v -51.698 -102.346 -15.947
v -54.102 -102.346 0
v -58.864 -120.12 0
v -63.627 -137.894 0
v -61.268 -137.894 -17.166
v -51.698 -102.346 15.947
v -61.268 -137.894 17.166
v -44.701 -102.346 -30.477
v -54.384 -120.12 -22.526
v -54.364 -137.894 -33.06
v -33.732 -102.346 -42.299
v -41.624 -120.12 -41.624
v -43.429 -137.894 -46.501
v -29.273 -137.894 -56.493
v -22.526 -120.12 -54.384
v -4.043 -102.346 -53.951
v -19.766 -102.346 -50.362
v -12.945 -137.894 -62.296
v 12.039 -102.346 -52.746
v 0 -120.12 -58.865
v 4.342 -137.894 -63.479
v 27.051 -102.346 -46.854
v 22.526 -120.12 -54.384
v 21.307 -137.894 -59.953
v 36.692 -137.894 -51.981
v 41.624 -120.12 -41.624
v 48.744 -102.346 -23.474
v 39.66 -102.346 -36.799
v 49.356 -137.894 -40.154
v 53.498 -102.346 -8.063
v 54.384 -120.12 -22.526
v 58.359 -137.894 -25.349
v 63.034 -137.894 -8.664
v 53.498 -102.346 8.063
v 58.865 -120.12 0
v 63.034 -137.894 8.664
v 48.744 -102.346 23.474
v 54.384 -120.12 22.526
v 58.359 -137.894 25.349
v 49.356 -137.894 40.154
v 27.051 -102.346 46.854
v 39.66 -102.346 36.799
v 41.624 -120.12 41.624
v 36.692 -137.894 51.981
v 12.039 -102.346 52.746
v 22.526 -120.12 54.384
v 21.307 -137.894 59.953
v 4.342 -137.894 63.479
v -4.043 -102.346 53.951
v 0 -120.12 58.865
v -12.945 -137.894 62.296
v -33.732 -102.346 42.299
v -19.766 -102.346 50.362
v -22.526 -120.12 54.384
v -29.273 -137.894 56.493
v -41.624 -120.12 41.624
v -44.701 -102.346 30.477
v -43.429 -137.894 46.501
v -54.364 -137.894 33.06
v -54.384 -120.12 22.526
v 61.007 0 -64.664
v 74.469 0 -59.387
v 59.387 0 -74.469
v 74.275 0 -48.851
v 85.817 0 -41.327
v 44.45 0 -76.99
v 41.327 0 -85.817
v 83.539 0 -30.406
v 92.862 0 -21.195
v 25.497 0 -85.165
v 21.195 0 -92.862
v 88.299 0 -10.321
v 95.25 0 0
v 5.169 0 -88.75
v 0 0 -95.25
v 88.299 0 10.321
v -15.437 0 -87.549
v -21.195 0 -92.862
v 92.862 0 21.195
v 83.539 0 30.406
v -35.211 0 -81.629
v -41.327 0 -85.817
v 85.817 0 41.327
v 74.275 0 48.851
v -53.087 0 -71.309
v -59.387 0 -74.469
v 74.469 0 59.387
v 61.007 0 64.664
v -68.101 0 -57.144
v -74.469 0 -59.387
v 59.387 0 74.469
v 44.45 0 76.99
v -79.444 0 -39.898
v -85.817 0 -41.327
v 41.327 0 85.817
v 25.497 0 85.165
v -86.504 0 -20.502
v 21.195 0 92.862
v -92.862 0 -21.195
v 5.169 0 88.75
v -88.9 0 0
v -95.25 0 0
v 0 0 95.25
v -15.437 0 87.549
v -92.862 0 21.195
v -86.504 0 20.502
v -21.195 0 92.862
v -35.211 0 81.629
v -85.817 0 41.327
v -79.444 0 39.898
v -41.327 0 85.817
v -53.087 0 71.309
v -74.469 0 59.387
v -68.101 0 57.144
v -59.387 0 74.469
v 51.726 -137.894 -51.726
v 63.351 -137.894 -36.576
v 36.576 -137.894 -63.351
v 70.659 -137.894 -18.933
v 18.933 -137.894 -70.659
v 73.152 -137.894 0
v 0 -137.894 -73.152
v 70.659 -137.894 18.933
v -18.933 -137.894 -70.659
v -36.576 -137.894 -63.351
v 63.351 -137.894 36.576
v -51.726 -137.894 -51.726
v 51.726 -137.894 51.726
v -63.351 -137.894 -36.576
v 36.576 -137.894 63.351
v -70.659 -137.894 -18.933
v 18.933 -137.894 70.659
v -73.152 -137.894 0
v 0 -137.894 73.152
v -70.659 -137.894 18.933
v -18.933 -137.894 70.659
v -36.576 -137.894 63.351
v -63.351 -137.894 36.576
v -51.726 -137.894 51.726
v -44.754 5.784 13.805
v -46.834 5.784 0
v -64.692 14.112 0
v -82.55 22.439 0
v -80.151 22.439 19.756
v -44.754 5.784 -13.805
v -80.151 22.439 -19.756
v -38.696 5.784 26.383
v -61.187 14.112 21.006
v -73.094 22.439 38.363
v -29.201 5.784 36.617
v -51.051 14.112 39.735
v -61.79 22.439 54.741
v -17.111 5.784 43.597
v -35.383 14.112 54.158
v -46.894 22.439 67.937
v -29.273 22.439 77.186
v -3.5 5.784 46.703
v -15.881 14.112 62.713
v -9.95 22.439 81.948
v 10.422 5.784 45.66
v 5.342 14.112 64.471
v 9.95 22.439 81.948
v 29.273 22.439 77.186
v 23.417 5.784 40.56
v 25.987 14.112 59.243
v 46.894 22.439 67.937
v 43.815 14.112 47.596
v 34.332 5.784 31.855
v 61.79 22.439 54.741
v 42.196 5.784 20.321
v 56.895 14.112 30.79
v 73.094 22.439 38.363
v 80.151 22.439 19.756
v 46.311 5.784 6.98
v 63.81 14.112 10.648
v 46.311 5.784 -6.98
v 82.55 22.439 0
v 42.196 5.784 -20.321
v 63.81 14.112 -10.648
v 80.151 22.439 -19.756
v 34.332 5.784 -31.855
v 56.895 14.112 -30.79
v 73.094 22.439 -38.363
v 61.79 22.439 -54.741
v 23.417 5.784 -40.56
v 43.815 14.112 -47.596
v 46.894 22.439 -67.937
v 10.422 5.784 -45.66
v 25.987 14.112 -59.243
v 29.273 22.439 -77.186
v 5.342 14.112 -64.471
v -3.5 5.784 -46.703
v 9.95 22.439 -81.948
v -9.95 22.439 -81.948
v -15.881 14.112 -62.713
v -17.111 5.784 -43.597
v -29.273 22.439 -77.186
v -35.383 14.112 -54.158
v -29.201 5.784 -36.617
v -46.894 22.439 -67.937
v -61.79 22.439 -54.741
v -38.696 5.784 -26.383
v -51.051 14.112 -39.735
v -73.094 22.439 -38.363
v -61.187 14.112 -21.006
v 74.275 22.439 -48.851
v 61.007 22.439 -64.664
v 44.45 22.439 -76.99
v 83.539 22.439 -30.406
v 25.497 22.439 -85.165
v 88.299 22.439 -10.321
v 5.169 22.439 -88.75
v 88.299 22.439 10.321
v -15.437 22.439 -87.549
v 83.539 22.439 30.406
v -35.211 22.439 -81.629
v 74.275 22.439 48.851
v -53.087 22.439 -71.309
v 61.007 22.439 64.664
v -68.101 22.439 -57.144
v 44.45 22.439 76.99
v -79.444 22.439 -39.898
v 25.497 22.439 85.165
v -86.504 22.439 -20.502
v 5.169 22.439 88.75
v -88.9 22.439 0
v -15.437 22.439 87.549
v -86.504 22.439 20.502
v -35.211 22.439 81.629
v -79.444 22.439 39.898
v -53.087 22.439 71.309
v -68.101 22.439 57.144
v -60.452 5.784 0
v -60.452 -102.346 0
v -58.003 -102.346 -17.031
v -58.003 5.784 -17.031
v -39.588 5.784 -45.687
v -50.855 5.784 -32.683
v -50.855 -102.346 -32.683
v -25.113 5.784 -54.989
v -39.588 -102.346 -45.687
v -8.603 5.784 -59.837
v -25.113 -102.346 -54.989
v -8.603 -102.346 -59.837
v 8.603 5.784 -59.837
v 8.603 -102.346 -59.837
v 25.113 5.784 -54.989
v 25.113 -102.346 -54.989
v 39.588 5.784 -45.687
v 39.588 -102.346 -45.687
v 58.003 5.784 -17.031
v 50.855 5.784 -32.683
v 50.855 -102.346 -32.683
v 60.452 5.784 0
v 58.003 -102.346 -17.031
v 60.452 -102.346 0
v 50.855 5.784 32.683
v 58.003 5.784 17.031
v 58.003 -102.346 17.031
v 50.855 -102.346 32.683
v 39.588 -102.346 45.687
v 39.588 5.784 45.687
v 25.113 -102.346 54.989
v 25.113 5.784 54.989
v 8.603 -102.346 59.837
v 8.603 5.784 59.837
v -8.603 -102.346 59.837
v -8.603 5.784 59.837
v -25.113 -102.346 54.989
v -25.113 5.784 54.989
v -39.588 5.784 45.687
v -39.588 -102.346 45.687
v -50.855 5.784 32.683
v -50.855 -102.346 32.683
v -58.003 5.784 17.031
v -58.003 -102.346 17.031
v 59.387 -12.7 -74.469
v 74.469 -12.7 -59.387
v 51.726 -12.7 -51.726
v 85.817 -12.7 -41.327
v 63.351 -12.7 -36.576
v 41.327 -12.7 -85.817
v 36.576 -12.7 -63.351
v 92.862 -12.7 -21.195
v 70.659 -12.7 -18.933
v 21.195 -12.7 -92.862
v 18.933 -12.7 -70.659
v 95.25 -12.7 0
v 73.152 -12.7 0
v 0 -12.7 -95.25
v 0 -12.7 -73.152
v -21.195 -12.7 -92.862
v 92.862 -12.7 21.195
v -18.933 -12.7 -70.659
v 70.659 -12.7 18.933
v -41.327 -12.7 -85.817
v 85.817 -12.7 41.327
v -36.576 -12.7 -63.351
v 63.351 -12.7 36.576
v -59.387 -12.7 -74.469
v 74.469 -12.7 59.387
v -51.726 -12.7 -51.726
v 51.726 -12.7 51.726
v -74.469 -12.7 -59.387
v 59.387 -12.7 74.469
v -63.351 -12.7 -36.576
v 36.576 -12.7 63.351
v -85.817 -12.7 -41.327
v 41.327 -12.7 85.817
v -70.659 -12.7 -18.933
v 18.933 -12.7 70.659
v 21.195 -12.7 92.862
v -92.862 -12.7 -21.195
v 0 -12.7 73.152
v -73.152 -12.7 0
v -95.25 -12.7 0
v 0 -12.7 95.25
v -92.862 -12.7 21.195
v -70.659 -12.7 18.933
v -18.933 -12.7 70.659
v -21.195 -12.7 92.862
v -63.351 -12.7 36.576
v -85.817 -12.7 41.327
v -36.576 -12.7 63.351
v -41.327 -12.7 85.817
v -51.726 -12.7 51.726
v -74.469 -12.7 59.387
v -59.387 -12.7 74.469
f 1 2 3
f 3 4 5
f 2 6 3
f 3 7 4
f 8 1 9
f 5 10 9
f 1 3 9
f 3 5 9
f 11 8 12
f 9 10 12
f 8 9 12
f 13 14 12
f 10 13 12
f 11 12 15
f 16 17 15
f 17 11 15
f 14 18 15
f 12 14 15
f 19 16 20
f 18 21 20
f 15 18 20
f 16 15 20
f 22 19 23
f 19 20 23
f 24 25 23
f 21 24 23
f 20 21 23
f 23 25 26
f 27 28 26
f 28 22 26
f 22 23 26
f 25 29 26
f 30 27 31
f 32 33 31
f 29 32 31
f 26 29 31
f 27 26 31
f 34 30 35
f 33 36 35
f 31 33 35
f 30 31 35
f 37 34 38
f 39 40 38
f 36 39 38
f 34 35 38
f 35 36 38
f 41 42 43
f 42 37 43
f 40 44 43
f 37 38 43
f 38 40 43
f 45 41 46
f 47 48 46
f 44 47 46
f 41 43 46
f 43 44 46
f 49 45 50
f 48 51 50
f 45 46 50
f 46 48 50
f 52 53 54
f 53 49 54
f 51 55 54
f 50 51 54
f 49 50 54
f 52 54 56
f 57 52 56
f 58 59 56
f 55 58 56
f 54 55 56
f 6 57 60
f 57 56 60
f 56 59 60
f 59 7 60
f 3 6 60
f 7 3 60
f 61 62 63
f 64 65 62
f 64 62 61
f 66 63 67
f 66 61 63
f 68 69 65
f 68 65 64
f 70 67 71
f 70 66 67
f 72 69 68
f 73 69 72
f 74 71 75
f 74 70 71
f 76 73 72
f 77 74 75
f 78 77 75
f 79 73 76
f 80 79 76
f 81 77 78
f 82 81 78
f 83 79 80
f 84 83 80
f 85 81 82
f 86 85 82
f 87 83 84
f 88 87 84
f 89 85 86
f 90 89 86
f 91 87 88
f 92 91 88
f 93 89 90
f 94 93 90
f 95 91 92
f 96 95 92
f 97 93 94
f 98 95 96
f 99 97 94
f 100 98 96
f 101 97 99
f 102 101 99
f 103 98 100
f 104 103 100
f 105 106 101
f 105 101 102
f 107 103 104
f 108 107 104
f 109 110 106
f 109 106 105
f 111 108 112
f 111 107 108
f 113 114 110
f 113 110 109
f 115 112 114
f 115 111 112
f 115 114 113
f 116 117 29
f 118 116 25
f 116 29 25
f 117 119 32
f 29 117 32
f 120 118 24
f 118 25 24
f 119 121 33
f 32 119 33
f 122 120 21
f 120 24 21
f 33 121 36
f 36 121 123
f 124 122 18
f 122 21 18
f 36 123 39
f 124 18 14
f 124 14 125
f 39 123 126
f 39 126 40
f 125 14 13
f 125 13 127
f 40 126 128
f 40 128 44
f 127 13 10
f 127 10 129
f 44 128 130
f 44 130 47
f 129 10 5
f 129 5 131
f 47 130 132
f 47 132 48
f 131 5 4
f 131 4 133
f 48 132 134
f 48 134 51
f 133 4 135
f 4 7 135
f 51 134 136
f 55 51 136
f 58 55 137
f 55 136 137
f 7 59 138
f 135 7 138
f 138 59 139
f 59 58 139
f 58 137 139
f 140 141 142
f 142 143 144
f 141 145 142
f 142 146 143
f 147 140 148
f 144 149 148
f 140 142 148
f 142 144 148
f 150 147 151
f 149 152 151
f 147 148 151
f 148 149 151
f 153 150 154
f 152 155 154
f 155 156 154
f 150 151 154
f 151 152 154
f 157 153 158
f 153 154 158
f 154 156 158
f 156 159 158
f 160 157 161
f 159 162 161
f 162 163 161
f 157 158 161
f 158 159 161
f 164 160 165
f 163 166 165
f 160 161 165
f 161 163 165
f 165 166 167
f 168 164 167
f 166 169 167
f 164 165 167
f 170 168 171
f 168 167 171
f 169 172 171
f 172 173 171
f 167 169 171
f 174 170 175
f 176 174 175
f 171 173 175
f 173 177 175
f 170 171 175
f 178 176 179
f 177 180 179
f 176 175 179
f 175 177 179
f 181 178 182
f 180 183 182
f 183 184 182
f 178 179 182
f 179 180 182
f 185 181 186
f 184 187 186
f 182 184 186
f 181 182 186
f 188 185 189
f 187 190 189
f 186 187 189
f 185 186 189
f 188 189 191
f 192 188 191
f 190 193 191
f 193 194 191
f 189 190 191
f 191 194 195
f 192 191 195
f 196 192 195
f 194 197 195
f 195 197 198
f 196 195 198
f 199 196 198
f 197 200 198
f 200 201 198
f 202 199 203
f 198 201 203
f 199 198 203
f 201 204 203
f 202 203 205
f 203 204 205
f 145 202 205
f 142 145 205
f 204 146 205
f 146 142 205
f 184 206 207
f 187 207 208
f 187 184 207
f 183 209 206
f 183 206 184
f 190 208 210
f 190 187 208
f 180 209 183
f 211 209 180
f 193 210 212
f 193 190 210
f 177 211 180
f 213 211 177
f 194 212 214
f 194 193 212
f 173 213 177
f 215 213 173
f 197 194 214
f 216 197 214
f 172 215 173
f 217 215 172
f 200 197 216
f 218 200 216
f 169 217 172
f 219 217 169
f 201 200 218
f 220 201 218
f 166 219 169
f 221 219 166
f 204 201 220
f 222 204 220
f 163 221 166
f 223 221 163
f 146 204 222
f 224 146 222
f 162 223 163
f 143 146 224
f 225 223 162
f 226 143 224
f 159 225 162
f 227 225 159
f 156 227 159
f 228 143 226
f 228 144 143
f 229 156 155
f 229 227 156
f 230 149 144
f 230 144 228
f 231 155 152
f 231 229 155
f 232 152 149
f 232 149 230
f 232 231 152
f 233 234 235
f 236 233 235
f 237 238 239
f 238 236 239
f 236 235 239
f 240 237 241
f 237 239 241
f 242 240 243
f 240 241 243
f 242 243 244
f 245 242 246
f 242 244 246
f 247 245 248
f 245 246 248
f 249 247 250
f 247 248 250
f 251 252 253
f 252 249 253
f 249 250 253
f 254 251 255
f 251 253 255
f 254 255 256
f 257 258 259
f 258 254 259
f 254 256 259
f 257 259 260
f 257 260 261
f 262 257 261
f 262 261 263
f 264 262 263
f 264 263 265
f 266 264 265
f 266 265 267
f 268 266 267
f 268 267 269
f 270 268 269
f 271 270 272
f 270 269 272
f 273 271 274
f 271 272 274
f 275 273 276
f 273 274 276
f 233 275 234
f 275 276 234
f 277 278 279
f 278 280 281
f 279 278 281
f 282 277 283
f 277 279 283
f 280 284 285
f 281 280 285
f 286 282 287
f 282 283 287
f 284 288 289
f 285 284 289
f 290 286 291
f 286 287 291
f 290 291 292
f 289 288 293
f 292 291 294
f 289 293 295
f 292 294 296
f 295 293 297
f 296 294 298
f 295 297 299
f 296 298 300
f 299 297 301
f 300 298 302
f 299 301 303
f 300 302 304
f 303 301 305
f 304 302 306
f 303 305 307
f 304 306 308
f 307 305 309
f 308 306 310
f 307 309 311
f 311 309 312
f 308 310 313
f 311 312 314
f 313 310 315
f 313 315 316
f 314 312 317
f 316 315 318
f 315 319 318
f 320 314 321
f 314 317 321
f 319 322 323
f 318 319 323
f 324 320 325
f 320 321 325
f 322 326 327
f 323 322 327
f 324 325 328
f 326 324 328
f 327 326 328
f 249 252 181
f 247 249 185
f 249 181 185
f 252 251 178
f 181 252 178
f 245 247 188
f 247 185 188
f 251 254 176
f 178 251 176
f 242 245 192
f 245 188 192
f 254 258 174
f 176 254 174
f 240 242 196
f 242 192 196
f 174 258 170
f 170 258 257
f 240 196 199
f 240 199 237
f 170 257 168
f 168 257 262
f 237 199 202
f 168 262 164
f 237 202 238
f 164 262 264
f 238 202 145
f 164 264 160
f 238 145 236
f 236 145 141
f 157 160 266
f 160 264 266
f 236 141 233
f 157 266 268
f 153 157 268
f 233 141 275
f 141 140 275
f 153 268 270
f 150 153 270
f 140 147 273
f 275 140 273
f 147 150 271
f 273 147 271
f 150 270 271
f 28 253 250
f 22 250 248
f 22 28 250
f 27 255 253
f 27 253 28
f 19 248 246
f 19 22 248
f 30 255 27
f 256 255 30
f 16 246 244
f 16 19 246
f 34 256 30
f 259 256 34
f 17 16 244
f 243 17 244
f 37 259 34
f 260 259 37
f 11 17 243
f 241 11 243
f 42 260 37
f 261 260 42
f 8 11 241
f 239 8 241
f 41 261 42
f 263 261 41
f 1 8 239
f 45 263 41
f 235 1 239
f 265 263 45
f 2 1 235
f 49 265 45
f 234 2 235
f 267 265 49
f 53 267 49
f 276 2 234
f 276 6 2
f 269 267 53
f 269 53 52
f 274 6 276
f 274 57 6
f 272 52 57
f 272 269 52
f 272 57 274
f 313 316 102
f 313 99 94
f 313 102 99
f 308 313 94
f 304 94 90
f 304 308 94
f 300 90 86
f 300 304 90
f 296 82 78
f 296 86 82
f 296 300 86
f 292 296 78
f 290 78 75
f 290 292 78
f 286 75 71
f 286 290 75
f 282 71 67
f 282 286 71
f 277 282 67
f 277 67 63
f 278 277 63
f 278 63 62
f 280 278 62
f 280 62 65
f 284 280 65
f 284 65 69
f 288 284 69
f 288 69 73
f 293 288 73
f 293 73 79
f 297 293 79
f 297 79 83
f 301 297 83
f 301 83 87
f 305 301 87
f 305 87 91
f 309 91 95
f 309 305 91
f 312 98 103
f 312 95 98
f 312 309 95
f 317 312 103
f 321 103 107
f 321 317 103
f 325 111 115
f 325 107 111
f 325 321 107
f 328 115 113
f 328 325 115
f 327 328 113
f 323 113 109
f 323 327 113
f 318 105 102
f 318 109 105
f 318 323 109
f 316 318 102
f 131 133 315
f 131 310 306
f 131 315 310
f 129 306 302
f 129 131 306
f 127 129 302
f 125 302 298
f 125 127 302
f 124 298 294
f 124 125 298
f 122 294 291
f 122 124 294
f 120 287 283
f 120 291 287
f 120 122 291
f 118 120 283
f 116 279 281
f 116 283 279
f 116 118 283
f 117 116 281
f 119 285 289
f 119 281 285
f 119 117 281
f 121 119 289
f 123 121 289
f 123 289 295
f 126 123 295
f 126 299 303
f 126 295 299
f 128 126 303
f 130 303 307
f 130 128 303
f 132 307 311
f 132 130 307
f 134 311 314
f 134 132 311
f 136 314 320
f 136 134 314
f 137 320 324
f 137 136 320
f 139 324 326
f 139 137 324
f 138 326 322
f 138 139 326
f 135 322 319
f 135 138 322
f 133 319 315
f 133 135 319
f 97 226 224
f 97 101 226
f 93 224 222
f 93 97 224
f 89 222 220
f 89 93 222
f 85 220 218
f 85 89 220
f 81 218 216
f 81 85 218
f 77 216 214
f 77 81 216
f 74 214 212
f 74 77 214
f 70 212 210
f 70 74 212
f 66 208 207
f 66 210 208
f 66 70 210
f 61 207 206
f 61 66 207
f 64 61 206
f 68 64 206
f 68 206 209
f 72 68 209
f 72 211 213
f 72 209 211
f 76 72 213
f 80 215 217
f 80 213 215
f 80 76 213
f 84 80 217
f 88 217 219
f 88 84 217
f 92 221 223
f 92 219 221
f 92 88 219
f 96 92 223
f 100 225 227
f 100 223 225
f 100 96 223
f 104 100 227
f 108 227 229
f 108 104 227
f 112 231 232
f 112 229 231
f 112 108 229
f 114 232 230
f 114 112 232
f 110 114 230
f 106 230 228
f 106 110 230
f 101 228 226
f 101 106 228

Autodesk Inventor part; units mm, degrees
ref_plane "YZ Plane" through (0, 0, 0) normal (1, 0, 0) x (0, 1, 0)
ref_plane "XZ Plane" through (0, 0, 0) normal (0, 1, 0) x (-1, 0, 0)
ref_plane "XY Plane" through (0, 0, 0) normal (0, 0, 1) x (1, 0, 0)
sketch "Sketch1" plane through (0, 0, 0) normal (0, 0, 1) x (1, 0, 0)
  line L0 (0, 25.4) -> (-28.702, 25.4) construction
  line L1 (0, 25.4) -> (-95.25, 25.4) construction
  line L2 (-95.25, 25.4) -> (-88.9, 25.4) construction
  line L3 (-88.9, 25.4) -> (-82.55, 22.4389) construction
  line L4 (-88.9, 25.4) -> (-88.9, 22.4389) construction
  line L5 (-88.9, 0) -> (-95.25, 0)
  line L6 (-28.702, 59.6457) -> (-28.702, -91.9304) construction
  arc A0 (-28.9184, -8.3597) -> (-32.3684, -0.9611) centre (-35.052, -6.7162) ccw
  line L7 (-76.2, -184.8171) -> (-28.9184, -8.3597)
  line L8 (-88.9, 22.4389) -> (-82.55, 22.4389)
  line L9 (-88.9, 22.4389) -> (-88.9, 0)
  line L10 (-82.55, 22.4389) -> (-32.3684, -0.9611)
  line L11 (-28.702, -6.7162) -> (-60.452, -6.7162) construction
  line L12 (-60.452, 12.1345) -> (-60.452, -126.0448) construction
  line L13 (-60.452, -126.0448) -> (-54.102, -126.0448) construction
  line L14 (-54.102, -126.0448) -> (-54.102, -102.3463) construction
  line L15 (-54.102, -102.3463) -> (-60.452, -102.3463)
  line L16 (-60.452, 12.1345) -> (-60.452, 2.6095) construction
  line L17 (-60.452, 12.1345) -> (-60.452, 5.7845) construction
  line L18 (-60.452, 5.7845) -> (-46.8344, 5.7845)
  line L19 (-60.452, 5.7845) -> (-60.452, -102.3463)
  line L20 (-95.25, 0) -> (-95.25, -12.7) construction
  line L21 (-60.452, -12.7) -> (-73.152, -12.7) construction
  line L22 (-95.25, -12.7) -> (-95.25, -25.4) construction
  line L23 (-95.25, -25.4) -> (-95.25, -88.9) construction
  line L24 (-95.25, -88.9) -> (-82.55, -88.9) construction
  line L25 (-82.55, -88.9) -> (-82.55, -25.4) construction
  line L26 (-95.25, -25.4) -> (-82.55, -25.4)
  line L27 (-82.55, -25.4) -> (-82.55, -88.9)
  line L28 (-82.55, -88.9) -> (-95.25, -88.9)
  line L29 (-95.25, -12.7) -> (-73.152, -12.7)
  line L30 (-73.152, -137.8941) -> (-63.627, -137.8941)
  line L31 (-82.55, -88.9) -> (-82.55, -184.8171)
  line L32 (-82.55, -184.8171) -> (-76.2, -184.8171)
  line L33 (-73.152, -12.7) -> (-73.152, -137.8941)
  line L34 (-88.9, -25.4) -> (-88.9, -31.3436)
  line L35 (-88.9, -31.3436) -> (-95.25, -31.3436)
  line L36 (-95.25, 0) -> (-95.25, -25.4)
  line L37 (-95.25, -31.3436) -> (-95.25, -88.9)
  line L38 (0, -319.0244) -> (0, 122.7573) projected
  point P0 (0, 0)
  point P1 (-95.25, -255.9127)
  point P2 (-85.725, 22.4389)
  dimension "d0" = 28.702
  dimension "d1" = 95.25
  dimension "d2" = 6.35
  dimension "d3" = 25
  dimension "d5" = 25.4
  dimension "d6" = 25.4
  dimension "d8" = 12.7
  dimension "d11" = 6.35
  dimension "d12" = 31.75
  dimension "d13" = 6.35
  dimension "d15" = 6.35
  dimension "d16" = 12.7
  dimension "d17" = 12.7
  dimension "d18" = 12.7
  dimension "d19" = 63.5
  dimension "d20" = 12.7
  dimension "d22" = 9.525
  dimension "d23" = 6.35
  dimension "d25" = 5.9436
  dimension "d26" = 15
revolve "Revolution2" add sketch "Sketch1" angle 360 about axis through (0, -10, 0) along (0, 1, 0) contours L9 L8 L10 L18 L19 L15 L7 L30 L33 L29 L36 L5
properties part number "Phenolic Master Sketch" material "Phenolic Resin"
